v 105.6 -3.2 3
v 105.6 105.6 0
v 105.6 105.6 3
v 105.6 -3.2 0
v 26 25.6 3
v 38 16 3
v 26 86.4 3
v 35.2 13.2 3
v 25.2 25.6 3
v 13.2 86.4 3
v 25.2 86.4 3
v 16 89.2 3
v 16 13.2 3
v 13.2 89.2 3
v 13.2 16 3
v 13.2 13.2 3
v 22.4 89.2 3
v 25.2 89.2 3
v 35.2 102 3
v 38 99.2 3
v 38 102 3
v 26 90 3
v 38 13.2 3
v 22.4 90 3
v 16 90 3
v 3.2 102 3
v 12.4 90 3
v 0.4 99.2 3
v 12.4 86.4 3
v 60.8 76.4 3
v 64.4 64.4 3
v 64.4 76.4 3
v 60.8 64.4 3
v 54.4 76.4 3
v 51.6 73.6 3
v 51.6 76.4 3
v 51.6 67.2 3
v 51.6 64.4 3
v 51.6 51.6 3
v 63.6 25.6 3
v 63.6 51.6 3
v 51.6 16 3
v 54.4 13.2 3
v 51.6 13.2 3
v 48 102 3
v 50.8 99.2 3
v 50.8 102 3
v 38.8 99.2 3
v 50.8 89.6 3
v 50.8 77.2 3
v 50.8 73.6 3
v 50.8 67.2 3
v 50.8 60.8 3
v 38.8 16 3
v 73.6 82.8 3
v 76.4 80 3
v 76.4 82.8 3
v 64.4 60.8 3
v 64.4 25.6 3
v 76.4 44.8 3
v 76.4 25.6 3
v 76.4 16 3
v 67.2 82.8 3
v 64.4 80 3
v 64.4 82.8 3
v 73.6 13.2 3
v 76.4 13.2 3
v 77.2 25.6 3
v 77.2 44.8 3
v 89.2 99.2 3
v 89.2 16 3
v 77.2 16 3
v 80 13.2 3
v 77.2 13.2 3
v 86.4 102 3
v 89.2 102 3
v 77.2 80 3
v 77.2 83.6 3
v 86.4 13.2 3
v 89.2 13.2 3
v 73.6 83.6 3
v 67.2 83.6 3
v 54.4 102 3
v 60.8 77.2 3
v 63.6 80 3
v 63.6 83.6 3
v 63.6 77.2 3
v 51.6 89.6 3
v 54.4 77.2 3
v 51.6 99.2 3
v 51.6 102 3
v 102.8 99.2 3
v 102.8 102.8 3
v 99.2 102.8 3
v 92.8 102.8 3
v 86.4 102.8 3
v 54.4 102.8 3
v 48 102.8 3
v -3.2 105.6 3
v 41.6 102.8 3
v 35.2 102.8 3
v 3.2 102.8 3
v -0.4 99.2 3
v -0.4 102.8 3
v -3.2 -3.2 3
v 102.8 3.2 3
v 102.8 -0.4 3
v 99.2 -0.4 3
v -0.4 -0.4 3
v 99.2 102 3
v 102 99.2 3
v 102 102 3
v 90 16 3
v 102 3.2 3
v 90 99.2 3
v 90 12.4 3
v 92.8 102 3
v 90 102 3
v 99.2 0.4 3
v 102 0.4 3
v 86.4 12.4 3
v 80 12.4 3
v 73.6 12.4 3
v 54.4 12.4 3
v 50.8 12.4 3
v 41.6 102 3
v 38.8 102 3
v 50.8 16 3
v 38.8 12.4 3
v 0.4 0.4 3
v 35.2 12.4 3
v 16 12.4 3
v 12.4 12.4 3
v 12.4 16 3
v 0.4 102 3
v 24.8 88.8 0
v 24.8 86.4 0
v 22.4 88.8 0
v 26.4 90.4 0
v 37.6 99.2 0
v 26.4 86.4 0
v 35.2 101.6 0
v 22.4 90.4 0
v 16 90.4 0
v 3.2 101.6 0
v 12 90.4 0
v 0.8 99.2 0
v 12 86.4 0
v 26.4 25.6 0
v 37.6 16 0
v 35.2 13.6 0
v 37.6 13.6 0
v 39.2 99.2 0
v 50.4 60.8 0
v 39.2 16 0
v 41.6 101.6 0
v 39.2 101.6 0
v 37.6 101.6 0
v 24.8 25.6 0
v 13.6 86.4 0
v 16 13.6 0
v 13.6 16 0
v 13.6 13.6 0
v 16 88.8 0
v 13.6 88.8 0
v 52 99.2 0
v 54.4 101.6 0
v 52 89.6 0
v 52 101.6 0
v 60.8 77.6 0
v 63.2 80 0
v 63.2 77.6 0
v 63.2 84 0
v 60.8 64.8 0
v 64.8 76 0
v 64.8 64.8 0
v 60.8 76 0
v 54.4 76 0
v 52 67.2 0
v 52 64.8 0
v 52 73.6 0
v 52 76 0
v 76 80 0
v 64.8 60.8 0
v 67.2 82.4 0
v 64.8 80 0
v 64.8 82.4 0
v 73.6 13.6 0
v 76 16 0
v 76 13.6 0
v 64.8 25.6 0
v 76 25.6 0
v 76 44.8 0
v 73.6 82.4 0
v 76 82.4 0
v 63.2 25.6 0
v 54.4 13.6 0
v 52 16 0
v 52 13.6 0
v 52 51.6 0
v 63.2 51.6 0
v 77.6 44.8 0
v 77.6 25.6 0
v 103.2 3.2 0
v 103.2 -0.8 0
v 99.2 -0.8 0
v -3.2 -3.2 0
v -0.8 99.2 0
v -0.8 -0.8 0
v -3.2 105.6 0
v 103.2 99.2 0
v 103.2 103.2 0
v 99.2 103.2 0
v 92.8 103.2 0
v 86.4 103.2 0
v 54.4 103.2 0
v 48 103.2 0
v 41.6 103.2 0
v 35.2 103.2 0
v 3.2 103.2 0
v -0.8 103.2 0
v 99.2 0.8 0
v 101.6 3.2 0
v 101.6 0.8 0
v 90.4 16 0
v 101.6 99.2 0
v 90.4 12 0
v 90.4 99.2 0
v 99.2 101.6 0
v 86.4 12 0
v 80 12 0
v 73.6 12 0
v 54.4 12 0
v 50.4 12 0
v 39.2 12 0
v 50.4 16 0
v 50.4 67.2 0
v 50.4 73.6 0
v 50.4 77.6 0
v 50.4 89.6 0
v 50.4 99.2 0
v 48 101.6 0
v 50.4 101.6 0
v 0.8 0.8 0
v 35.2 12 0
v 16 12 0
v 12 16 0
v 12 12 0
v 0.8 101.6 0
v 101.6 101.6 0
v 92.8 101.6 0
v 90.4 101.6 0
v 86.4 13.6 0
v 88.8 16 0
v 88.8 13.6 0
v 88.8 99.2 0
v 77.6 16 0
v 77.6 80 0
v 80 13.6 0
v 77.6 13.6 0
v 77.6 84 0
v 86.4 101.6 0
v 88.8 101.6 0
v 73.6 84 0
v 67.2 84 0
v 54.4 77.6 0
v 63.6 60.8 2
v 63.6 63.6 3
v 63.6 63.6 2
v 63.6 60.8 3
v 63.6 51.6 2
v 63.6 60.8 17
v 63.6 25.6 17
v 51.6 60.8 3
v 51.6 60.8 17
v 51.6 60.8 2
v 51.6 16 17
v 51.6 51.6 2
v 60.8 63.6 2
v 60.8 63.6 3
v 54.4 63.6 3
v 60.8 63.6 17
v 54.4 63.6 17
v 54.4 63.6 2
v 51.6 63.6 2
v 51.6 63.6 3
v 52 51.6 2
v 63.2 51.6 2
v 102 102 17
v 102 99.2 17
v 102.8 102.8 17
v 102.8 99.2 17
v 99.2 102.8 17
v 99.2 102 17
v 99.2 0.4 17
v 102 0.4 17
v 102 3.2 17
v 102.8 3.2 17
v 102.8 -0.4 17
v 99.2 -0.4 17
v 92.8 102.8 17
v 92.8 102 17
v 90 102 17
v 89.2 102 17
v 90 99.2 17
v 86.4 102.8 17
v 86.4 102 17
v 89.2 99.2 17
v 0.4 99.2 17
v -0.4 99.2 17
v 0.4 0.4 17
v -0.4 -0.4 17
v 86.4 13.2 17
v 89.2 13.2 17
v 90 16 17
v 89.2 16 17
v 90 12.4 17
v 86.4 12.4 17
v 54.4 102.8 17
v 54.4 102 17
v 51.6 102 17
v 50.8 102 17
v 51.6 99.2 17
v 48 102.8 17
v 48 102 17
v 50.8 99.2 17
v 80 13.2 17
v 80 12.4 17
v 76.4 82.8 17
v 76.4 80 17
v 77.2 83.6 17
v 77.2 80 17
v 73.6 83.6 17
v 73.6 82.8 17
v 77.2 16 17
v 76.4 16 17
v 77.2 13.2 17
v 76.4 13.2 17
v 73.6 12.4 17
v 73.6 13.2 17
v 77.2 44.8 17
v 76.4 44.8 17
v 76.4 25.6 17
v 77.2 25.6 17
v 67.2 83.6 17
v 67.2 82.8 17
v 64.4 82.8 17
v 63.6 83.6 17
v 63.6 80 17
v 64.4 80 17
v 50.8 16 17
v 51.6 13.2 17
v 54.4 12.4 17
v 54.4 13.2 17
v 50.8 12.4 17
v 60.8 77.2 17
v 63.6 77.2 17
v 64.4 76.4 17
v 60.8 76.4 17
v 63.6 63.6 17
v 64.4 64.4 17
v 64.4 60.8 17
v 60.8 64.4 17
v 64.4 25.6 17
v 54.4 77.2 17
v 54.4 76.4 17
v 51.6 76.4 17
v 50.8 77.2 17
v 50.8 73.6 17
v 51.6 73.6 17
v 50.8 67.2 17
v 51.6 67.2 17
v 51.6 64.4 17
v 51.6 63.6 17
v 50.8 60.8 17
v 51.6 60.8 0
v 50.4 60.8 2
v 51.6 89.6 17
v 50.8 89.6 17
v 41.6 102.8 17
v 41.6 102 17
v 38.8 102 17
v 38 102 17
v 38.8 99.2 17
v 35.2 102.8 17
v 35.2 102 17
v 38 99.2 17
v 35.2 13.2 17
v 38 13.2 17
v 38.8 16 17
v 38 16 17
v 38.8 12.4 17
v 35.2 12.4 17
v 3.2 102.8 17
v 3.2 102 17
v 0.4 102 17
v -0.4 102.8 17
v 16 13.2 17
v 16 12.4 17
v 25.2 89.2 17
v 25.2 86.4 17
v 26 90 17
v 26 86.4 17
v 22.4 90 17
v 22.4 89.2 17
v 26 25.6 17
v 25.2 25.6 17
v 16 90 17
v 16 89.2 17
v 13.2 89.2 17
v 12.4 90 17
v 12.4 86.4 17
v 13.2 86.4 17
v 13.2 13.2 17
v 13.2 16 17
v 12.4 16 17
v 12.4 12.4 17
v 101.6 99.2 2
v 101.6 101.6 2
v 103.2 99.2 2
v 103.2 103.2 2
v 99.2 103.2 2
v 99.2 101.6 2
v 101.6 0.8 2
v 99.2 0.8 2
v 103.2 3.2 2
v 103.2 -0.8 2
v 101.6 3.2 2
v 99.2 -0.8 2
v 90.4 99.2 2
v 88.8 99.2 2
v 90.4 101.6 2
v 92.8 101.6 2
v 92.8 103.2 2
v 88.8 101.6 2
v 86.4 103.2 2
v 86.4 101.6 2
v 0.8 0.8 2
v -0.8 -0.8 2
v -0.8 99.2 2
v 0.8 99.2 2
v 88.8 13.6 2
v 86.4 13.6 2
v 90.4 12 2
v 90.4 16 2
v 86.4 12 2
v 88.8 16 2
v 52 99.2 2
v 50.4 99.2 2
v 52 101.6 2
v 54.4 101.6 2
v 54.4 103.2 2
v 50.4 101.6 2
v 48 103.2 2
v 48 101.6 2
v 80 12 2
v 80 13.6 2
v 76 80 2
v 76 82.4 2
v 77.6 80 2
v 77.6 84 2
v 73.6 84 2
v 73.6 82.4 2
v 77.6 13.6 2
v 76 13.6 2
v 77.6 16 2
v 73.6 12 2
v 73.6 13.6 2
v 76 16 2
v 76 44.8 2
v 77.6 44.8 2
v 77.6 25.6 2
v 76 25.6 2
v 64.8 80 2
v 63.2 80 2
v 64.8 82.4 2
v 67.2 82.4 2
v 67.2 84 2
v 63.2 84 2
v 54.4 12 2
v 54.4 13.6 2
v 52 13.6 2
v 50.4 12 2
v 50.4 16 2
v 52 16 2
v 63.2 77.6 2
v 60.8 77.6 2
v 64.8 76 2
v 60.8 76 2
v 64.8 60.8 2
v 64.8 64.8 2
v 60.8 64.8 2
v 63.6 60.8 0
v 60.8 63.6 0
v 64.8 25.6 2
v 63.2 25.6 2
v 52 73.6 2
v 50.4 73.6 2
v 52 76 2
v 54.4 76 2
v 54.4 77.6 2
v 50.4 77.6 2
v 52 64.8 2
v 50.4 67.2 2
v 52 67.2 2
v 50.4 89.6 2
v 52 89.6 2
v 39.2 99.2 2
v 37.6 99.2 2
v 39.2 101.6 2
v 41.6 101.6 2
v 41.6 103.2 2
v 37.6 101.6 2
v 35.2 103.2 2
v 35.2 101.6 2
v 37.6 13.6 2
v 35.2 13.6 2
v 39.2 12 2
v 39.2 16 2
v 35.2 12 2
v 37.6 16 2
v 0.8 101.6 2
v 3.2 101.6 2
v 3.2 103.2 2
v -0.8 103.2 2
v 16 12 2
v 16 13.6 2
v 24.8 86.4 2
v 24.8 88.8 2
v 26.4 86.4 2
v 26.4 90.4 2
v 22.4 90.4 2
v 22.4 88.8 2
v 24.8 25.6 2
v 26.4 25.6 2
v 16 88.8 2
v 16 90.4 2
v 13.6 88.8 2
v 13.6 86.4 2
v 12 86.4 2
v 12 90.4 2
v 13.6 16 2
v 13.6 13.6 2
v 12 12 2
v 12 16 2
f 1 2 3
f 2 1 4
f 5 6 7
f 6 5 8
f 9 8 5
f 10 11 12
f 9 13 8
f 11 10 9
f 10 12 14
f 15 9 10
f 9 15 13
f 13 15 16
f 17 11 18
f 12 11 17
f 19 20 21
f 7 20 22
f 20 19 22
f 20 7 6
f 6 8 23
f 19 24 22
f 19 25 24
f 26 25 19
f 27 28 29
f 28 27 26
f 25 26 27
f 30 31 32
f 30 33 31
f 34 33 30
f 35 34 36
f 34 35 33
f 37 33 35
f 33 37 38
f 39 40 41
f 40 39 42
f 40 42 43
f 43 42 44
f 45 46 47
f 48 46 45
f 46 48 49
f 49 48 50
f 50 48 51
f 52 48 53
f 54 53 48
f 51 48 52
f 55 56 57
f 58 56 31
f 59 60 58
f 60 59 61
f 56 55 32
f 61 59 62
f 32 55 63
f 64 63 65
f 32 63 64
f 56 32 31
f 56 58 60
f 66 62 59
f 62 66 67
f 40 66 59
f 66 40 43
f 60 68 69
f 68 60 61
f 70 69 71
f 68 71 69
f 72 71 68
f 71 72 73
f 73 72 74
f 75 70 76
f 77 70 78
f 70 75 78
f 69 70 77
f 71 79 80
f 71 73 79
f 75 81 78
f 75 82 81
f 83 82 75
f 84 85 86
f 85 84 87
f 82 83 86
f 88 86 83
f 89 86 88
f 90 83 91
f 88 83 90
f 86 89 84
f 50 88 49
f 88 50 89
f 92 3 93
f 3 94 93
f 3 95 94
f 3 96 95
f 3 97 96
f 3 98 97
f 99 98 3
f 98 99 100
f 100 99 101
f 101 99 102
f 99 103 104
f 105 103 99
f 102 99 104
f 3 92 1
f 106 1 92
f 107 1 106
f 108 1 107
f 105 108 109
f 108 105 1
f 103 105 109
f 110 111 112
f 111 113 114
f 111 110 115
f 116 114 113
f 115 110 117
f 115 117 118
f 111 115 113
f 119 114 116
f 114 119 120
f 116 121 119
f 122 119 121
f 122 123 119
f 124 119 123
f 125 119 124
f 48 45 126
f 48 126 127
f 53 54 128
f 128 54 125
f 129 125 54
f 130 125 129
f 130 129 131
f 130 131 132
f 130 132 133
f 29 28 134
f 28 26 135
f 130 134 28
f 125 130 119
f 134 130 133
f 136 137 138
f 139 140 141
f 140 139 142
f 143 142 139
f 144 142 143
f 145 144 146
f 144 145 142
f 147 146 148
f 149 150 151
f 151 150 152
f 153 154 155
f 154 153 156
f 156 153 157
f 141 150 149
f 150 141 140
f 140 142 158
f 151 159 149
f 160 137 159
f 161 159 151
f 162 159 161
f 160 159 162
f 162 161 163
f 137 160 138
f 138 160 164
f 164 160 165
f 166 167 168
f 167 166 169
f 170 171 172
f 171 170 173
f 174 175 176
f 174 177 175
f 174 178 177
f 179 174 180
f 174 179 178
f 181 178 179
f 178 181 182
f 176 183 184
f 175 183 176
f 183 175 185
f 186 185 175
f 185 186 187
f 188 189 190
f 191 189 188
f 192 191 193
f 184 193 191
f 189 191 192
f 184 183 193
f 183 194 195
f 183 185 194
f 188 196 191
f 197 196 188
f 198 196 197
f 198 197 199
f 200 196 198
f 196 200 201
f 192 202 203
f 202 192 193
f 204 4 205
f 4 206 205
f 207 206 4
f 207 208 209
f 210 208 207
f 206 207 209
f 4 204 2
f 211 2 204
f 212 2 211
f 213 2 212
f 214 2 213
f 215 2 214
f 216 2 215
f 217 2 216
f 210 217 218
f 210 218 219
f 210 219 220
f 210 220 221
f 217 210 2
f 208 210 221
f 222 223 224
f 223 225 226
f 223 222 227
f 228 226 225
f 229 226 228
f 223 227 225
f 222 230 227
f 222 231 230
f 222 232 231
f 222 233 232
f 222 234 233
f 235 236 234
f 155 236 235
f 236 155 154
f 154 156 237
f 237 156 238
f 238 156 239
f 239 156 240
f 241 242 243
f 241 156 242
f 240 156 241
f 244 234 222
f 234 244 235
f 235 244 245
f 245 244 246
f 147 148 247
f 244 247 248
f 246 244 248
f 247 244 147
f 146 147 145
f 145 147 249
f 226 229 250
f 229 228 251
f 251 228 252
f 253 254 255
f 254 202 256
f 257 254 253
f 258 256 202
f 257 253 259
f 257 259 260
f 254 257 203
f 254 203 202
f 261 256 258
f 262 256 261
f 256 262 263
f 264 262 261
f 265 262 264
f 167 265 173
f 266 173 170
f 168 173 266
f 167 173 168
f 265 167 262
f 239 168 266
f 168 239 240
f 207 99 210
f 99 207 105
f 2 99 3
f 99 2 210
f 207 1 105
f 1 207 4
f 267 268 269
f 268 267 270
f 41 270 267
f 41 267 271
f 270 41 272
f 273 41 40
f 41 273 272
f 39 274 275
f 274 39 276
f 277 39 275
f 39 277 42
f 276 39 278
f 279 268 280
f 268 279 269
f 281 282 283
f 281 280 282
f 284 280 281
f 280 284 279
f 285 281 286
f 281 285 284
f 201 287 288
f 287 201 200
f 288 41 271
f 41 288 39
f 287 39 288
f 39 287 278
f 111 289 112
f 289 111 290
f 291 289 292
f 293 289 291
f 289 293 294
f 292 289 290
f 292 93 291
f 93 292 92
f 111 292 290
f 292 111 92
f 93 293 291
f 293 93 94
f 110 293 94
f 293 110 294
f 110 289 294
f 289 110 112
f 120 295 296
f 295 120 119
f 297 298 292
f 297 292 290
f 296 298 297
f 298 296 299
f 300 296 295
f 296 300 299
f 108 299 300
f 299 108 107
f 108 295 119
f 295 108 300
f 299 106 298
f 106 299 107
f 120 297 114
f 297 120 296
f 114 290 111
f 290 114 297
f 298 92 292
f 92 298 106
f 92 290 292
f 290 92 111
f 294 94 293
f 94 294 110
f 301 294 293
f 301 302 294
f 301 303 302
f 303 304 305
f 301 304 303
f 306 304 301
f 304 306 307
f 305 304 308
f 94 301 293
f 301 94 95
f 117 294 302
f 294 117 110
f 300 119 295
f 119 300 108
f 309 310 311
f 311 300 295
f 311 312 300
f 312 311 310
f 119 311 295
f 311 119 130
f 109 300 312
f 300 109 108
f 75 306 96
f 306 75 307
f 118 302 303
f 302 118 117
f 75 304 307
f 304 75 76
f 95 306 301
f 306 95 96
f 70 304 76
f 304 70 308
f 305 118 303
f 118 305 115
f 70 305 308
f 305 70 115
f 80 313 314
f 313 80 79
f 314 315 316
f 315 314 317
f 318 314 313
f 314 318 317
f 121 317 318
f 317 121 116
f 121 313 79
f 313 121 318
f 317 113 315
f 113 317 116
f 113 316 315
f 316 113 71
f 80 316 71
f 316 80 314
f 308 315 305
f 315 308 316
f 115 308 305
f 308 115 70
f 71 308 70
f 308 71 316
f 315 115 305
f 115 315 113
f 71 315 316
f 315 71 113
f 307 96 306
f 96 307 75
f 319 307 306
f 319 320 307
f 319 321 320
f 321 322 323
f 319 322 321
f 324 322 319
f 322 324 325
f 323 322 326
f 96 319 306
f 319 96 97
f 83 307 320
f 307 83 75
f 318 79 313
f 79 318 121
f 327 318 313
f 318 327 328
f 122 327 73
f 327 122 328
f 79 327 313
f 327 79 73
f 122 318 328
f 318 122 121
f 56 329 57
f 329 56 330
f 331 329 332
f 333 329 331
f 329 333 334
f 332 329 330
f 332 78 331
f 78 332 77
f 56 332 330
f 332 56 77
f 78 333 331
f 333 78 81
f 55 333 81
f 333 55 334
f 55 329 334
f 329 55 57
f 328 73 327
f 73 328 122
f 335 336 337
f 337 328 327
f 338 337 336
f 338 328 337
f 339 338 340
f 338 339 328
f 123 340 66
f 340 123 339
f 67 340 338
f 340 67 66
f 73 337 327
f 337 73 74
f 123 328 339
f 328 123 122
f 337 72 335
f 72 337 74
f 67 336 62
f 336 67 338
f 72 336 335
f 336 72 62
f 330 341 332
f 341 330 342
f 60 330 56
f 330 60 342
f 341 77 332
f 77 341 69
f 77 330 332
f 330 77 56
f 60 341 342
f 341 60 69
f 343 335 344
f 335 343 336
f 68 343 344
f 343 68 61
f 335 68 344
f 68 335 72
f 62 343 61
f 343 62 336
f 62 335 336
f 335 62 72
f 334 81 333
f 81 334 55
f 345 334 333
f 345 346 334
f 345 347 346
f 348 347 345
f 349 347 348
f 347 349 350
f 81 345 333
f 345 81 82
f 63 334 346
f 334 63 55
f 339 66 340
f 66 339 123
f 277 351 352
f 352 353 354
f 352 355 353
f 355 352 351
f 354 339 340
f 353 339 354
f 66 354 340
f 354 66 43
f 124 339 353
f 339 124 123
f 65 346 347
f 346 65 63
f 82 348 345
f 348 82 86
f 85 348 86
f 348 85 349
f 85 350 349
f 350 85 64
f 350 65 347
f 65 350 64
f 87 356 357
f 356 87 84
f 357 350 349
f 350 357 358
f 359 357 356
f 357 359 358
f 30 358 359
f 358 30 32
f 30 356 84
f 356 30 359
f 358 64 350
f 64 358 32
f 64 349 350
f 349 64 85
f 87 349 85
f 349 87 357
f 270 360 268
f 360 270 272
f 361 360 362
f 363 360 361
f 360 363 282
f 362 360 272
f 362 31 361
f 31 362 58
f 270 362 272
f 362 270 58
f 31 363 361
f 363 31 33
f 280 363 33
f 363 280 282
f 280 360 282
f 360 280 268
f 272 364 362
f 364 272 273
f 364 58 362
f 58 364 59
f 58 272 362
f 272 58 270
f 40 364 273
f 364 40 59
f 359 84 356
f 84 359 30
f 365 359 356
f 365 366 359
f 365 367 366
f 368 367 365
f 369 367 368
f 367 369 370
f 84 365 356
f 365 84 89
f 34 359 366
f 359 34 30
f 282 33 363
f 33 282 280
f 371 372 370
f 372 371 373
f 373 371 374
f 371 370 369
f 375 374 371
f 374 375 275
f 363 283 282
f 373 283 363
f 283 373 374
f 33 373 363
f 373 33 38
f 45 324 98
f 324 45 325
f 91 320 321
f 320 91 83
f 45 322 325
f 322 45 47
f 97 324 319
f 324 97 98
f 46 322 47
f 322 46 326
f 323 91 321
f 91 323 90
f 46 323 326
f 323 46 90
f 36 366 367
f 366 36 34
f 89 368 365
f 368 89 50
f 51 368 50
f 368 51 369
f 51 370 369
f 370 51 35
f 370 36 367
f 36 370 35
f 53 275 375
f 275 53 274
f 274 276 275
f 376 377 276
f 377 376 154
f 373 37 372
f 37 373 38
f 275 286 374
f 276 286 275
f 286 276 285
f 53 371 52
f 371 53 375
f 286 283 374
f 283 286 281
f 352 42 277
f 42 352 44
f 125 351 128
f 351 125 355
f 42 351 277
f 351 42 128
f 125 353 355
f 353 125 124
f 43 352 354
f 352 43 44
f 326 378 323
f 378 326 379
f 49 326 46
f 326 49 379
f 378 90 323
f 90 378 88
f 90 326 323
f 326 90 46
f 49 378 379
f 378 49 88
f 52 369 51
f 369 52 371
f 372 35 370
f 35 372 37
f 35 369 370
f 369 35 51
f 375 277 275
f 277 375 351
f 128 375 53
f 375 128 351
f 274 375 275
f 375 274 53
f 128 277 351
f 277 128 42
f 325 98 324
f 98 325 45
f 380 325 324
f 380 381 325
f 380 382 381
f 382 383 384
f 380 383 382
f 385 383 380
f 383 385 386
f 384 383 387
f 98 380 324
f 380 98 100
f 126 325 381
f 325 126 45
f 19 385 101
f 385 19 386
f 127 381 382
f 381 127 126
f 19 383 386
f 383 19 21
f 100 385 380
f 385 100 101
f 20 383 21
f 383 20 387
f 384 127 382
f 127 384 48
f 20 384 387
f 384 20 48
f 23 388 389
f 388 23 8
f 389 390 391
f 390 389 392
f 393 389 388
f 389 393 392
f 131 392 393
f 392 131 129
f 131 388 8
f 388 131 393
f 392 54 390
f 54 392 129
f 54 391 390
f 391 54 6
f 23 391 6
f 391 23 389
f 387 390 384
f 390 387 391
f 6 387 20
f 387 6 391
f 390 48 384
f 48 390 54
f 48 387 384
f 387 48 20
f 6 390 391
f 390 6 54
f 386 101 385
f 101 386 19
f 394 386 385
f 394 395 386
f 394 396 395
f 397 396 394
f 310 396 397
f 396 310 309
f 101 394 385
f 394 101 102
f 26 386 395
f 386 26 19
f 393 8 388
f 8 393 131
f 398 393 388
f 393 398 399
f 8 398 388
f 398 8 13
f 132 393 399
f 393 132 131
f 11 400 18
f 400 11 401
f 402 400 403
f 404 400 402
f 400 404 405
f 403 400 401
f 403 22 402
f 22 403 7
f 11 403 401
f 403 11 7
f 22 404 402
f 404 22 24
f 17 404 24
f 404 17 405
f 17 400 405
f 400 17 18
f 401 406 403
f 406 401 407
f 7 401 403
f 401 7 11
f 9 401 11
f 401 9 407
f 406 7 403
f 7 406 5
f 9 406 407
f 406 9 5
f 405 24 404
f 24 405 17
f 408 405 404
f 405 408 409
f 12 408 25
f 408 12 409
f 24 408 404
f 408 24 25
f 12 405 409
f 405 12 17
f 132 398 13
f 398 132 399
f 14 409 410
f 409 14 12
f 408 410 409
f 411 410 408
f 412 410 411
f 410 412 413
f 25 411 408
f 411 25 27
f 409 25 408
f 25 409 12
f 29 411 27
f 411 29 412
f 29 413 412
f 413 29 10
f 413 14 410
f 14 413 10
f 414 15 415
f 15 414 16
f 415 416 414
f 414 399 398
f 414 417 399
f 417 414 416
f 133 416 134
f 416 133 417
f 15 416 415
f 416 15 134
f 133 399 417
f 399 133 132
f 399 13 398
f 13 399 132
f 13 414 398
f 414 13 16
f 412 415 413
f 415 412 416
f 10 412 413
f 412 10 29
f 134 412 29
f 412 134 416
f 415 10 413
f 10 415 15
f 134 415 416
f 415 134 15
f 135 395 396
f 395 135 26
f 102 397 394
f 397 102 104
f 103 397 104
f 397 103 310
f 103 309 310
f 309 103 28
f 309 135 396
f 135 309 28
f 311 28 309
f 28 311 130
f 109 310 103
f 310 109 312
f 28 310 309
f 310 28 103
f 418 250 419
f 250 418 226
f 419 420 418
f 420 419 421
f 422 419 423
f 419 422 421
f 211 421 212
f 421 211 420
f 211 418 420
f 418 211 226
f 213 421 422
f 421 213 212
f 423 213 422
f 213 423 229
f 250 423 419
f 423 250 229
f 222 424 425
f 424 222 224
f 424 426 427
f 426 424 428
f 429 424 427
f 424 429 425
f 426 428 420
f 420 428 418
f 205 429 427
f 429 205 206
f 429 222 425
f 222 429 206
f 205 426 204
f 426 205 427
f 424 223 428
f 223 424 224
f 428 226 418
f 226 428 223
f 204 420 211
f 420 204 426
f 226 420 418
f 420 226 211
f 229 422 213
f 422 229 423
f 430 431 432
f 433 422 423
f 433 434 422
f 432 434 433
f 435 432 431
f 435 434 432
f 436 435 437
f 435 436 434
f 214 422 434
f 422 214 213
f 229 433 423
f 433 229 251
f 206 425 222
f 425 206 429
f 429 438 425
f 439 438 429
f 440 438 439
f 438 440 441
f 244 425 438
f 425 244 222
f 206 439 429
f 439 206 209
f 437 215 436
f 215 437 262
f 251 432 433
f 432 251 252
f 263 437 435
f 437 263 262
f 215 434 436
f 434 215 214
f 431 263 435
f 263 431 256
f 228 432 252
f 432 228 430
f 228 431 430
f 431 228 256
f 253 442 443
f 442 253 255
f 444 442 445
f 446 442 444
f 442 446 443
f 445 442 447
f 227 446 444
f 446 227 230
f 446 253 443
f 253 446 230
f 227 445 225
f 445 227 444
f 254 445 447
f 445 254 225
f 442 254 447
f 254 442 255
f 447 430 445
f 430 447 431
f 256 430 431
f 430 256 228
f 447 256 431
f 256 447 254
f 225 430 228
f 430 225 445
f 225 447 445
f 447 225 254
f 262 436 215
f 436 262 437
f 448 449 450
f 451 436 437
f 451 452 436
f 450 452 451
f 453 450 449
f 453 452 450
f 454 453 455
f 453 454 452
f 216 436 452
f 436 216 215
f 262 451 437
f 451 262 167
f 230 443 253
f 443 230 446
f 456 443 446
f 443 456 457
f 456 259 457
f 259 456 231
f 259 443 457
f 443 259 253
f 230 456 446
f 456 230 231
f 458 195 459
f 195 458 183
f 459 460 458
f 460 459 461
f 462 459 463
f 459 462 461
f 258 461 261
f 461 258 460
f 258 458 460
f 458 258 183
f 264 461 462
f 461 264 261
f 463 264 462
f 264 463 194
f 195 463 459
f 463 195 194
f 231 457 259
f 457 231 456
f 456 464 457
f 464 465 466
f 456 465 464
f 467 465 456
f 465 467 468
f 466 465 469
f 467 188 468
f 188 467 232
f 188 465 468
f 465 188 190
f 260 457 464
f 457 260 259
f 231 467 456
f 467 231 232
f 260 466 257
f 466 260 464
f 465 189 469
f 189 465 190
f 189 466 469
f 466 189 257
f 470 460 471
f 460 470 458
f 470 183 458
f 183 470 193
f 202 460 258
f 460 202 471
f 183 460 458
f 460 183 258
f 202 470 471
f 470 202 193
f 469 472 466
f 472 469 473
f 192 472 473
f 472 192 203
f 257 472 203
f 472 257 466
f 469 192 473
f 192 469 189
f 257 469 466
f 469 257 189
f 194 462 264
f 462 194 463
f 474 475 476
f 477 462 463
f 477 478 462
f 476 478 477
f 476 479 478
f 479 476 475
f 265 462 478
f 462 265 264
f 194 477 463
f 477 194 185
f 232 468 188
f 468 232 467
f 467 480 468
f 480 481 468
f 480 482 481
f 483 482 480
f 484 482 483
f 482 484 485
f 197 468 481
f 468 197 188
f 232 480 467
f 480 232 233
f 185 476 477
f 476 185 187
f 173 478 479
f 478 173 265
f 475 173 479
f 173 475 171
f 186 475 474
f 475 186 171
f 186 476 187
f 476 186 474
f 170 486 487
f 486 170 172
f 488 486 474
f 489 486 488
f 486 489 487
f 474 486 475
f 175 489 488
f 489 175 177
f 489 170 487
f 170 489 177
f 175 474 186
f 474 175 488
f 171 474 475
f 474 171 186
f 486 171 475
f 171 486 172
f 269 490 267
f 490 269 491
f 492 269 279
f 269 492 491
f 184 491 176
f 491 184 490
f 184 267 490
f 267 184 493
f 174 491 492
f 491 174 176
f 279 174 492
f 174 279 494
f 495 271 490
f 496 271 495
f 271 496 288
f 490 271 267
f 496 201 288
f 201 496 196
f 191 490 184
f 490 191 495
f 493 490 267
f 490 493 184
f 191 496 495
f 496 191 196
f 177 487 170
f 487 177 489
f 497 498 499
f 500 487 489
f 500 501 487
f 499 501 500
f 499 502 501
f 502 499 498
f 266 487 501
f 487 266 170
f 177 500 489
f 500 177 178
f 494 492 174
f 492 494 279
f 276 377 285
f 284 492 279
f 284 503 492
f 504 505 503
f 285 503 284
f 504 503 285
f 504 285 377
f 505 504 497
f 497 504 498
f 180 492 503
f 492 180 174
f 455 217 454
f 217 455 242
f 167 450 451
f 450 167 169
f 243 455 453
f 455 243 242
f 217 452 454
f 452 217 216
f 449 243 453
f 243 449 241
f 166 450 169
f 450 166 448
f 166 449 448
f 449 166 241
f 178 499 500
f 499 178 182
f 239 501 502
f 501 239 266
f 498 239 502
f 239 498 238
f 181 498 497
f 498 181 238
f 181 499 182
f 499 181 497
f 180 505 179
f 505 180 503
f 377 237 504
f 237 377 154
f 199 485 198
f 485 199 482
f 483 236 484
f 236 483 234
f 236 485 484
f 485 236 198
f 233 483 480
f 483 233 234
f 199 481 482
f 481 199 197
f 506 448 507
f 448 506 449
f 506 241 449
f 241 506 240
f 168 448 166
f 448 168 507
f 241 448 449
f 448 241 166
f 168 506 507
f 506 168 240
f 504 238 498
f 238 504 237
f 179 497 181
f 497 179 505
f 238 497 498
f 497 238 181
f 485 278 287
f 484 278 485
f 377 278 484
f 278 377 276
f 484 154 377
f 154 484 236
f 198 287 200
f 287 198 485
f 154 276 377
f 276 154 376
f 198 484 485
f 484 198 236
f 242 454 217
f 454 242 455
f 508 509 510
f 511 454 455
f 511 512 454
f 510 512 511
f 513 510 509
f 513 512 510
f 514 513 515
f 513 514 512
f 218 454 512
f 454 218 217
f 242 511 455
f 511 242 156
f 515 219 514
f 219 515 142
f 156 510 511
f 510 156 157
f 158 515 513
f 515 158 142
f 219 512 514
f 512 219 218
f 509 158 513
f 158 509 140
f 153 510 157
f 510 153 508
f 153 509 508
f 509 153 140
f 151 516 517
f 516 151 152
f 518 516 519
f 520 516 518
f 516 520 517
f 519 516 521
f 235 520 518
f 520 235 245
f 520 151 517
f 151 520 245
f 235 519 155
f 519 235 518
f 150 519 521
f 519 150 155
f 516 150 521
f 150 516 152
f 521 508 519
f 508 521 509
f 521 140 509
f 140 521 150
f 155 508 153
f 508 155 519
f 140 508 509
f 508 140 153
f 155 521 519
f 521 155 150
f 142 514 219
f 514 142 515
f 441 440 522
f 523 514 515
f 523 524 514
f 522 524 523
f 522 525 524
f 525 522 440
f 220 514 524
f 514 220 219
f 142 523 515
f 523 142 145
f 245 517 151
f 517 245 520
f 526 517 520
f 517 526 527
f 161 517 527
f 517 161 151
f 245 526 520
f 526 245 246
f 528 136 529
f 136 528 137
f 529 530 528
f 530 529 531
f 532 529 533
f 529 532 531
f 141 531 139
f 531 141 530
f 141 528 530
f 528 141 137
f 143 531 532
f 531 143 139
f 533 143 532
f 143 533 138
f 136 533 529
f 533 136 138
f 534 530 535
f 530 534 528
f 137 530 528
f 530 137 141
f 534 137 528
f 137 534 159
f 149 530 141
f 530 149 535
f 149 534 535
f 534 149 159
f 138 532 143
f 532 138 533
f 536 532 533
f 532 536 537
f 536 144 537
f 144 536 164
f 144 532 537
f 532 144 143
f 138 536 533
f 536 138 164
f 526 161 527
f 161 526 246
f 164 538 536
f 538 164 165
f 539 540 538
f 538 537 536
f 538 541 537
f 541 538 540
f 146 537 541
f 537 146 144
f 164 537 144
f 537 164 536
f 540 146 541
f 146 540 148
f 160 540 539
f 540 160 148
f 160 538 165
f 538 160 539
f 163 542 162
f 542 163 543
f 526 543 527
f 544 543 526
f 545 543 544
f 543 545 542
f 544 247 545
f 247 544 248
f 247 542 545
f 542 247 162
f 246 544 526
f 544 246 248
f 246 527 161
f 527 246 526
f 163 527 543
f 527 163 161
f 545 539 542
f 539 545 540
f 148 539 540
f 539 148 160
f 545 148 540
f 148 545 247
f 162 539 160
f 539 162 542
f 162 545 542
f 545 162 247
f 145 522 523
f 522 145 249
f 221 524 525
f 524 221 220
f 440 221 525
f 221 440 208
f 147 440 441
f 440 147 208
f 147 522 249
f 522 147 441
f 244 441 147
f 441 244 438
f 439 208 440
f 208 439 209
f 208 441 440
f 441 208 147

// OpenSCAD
// file: ../../code/enclosing-box.scad
module box(levels) {
    count = len(levels);
    l1 = levels[0];
    sw = len(l1);
    extraSpace = 3*nozzleDiameter;
    bt = nozzleDiameter*3; // box wall thickness
    
    b1Xs = sw*w + extraSpace; // box inside X size
    b1Ys = b1Xs;
    b1Zs = (wh-levelOverlap)*count+levelOverlap + extraSpace;
    
    
    echo("Box insides: ", b1Xs, b1Ys, b1Zs);
    rotate([180,0,0])
    difference() {
        translate([-bt, -bt, 0])
            cube([
                b1Xs+2*bt, 
                b1Ys+2*bt, 
                b1Zs+1*bt
            ]);
        cube([b1Xs, b1Ys, b1Zs]);

        
        // hole for ball entrance
        xy=extraSpace+w/2;
        translate([xy,xy,b1Zs+bt-2*layerHeight]) {
            holes(l1, STARTING_POINT);
        }

        
        translate([0,0,b1Zs+bt-2*layerHeight]) {
            // draw levels on box
            for(i = [1:count]) {
                marginX =     b1Ys/count   - extraSpace;
                marginY = (i*(b1Ys/count)) - extraSpace;
                translate([b1Xs-marginX, b1Ys-marginY, 0])
                levelContour(levels[i-1], count);
            }
        }
    }   
}


module levelContour(level, count) {
    // scale down to fit all mazes into one row on top of the box
    scale(1/count) {
        // count is used in wallThickness multiplication here to compensate scale down factor
        // also, to make walls visible better, increasing adding additional multiplication factor
        walls(level, 2*count*wallThickness); 
    }
}
// file: ../../code/main.scad
include <enclosing-box.scad>;

// DRAWING SYMBOLS
WALL_VERTICAL = "|";
WALL_VERTICAL_TOP = "╹";
WALL_VERTICAL_BOTTOM = "╻";
WALL_HORIZONTAL = "─";
WALL_HORIZONTAL_LEFT = "╸";
WALL_HORIZONTAL_RIGHT = "╺";

CORNER_PLUS="+";

CORNER_TOP_LEFT="┌";
CORNER_TOP_RIGHT= "┐";
CORNER_BOTTOM_RIGHT="┘";
CORNER_BOTTOM_LEFT="└";

CORNER_T="┬";
CORNER_T_DOWN="┴";
CORNER_T_LEFT="├";
CORNER_T_RIGHT="┤";

SPACE = " ";
HOLE = "X";
STARTING_POINT = "O";

template3x3 = [
"┌───────┐",
"|X      |",
"| ┌─┬─┐ |",
"| | ╹ | |",
"| ├╸+╺┤ |",
"| | ╻ | |",
"| └─┴─┘ |",
"|      O|",
"└───────┘"];


// PARAMETERS
ballSize = 12;

levelOverlap = 2; // how much below level should go into the bottom plate
bpt = levelOverlap + 1; // bottom plate thickness
nozzleDiameter = 0.4;
layerHeight = 0.2;
wallThickness = nozzleDiameter*2; // wall thickness
wh = ballSize+bpt+levelOverlap; // wall height


// VARIABLES
w = ballSize/2+wallThickness/2; // width of the cell


// HELPER METHODS
module labyrinthLevels(currentLevel, levelBelow) {
    difference() {
        labyrinth(currentLevel);
        translate([0,0,-wh+levelOverlap])
            labyrinth(levelBelow, wallThickness+nozzleDiameter*2); // add extra two lines space for walls' overlap
    }
}

module labyrinth(lab, wallThickness = wallThickness) {
    bottom(lab);
    walls(lab, wallThickness);
}

module bottom(lab) {
    sw=len(lab[0]);
    boardSize = sw*w;
    difference() {
        translate([-w/2,-w/2,0])
            cube([boardSize, boardSize, bpt]);
        holes(lab);
    }
}

module walls(lab, wallThickness=wallThickness) {
    sw=len(lab[0]);
    for(x=[0:sw-1]) {
        for(y=[0:sw-1]) {
            cell = lab[x][y];
            tx=sw-x-1; ty=sw-y-1;
            translate([tx*w, ty*w, 0]) {
                if (cell == WALL_VERTICAL) {
                    wallVertical(wallThickness);
                } else if (cell == WALL_VERTICAL_TOP) {
                    wallVerticalTop(wallThickness);
                } else if (cell == WALL_VERTICAL_BOTTOM) {
                    wallVerticalBottom(wallThickness);
                } else if (cell == WALL_HORIZONTAL) {
                    wallHorizontal(wallThickness);
                } else if (cell == WALL_HORIZONTAL_LEFT) {
                    wallHorizontalLeft(wallThickness);
                } else if (cell == WALL_HORIZONTAL_RIGHT) {
                    wallHorizontalRight(wallThickness);
                } else if (cell == CORNER_TOP_LEFT) {
                    cornerTopLeft(wallThickness);
                } else if (cell == CORNER_TOP_RIGHT) {
                    cornerTopRight(wallThickness);
                } else if (cell == CORNER_BOTTOM_RIGHT) {
                    cornerBottomRight(wallThickness);
                } else if (cell == CORNER_BOTTOM_LEFT) {
                    cornerBottomLeft(wallThickness);
                } else if (cell == CORNER_T) {
                    cornerT(wallThickness);
                } else if (cell == CORNER_T_RIGHT) {
                    cornerTRight(wallThickness);
                } else if (cell == CORNER_T_DOWN) {
                    cornerTDown(wallThickness);
                } else if (cell == CORNER_T_LEFT) {
                    cornerTLeft(wallThickness);
                } else if (cell == CORNER_PLUS) {
                    cornerPlus(wallThickness);
                }
            }
        }
    }
}

module holes(lab, holeSymbol = HOLE) {
    sw=len(lab[0]);
    for(x=[0:sw-1]) {
        for(y=[0:sw-1]) {
            cell = lab[x][y];
            if (cell == holeSymbol) {
                tx=sw-x-1; ty=sw-y-1;
                translate([tx*w, ty*w, 0]) {
                    hole();
                }
            }
        }
    }
}

module hole() {
    s=w+w-wallThickness;
    translate([-s/2,-s/2, -1])
        cube([s, s, bpt+2]);
}

module wallHorizontal(wallThickness) {
    rotate([0,0,90])
        wall(wallThickness);
}

module wallVertical(wallThickness) {
    wall(wallThickness);
}
module wallVerticalTop(wallThickness) {
    wallHalf(wallThickness);
}
module wallVerticalBottom(wallThickness) {
    rotate([0,0,180])
        wallHalf(wallThickness);
}
module wallHorizontalLeft(wallThickness) {
    rotate([0,0,90])
        wallHalf(wallThickness);
}
module wallHorizontalRight(wallThickness) {
    rotate([0,0,270])
        wallHalf(wallThickness);
}

module wall(wallThickness) {
    translate([-w/2,-wallThickness/2, 0])
        cube([w, wallThickness, wh]);
}
module wallHalf(wallThickness) {
    translate([0,-wallThickness/2, 0])
        cube([w/2, wallThickness, wh]);
}

module cornerTopLeft(wallThickness) {
    rotate([0,0,180])
        corner(wallThickness);
}
module cornerTopRight(wallThickness) {
    rotate([0,0,90])
        corner(wallThickness);
}
module cornerBottomRight(wallThickness) {
    corner(wallThickness);
}
module cornerBottomLeft(wallThickness) {
    rotate([0,0,270])
        corner(wallThickness);
}

module corner(wallThickness) {
    translate([-wallThickness/2,-wallThickness/2,0])
        cube([wallThickness, w/2+wallThickness/2, wh]);
    translate([-wallThickness/2,-wallThickness/2, 0])
        cube([w/2+wallThickness/2, wallThickness, wh]);
}

module cornerPlus(wallThickness) {
    translate([-w/2,-wallThickness/2, 0])
        cube([w, wallThickness, wh]);    
    translate([-wallThickness/2,-w/2,0])
        cube([wallThickness, w, wh]);
}

module cornerT(wallThickness) {
    rotate([0,0,90]) {
        translate([-w/2,-wallThickness/2, 0])
            cube([w, wallThickness, wh]);    
        translate([-wallThickness/2,-wallThickness/2,0])
            cube([wallThickness, w/2+wallThickness/2, wh]);
    }
}

module cornerTRight(wallThickness) {
    rotate([0,0,270])
        cornerT(wallThickness);
}

module cornerTDown(wallThickness) {
    rotate([0,0,180])
        cornerT(wallThickness);
}

module cornerTLeft(wallThickness) {
    rotate([0,0,90])
        cornerT(wallThickness);
}
// main file
include <../../code/main.scad>

labyrinthLevels(maze8x8level1, maze8x8level2);
//labyrinthLevels(maze8x8level2, maze8x8level3);
//labyrinthLevels(maze8x8level3, maze8x8level4);
//labyrinth(maze8x8level4);
//box([maze8x8level1,maze8x8level2,maze8x8level3,maze8x8level4]);

maze8x8level1 = [
"┌───────────────┐",
"|               |",
"├─────────────┐ |",
"|             | |",
"|  ┌─────╸  ╺─┤ |",
"|  |          | |",
"|  └┐ ┌─────╸ | |",
"|   | |X      | |",
"├─╸ └─┴───────┘ |",
"|               |",
"├─────────────┐ |",
"|             | |",
"| ┌─────────╸ | |",
"| |O          | |",
"| └───────────┘ |",
"|               |",
"└───────────────┘"];
maze8x8level2 = [
"┌───────────────┐",
"|X              |",
"├─────────────┐ |",
"|             | |",
"|  ┌─────╸  ╺─┤ |",
"|  |          | |",
"|  └┐ ┌─────╸ | |",
"|   | |O      | |",
"├─╸ └─┴───────┘ |",
"|               |",
"├─────────────┐ |",
"|             | |",
"| ┌─────────╸ | |",
"| |           | |",
"| └───────────┘ |",
"|               |",
"└───────────────┘"];
maze8x8level3 = [
"┌───────────────┐",
"|O              |",
"├─────────────┐ |",
"|             | |",
"|  ┌─────╸  ╺─┤ |",
"|  |          | |",
"|  └┐ ┌─────╸ | |",
"|   | |       | |",
"├─╸ └─┴───────┘ |",
"|               |",
"├─────────────┐ |",
"|             | |",
"| ┌─────────╸ | |",
"| |X          | |",
"| └───────────┘ |",
"|               |",
"└───────────────┘"];
maze8x8level4 = [
"┌───────────────┐",
"|               |",
"├─────────────┐ |",
"|             | |",
"|  ┌─────╸  ╺─┤ |",
"|  |          | |",
"|  └┐ ┌─────╸ | |",
"|   | |X      | |",
"├─╸ └─┴───────┘ |",
"|               |",
"├─────────────┐ |",
"|             | |",
"| ┌─────────╸ | |",
"| |O          | |",
"| └───────────┘ |",
"|               |",
"└───────────────┘"];
